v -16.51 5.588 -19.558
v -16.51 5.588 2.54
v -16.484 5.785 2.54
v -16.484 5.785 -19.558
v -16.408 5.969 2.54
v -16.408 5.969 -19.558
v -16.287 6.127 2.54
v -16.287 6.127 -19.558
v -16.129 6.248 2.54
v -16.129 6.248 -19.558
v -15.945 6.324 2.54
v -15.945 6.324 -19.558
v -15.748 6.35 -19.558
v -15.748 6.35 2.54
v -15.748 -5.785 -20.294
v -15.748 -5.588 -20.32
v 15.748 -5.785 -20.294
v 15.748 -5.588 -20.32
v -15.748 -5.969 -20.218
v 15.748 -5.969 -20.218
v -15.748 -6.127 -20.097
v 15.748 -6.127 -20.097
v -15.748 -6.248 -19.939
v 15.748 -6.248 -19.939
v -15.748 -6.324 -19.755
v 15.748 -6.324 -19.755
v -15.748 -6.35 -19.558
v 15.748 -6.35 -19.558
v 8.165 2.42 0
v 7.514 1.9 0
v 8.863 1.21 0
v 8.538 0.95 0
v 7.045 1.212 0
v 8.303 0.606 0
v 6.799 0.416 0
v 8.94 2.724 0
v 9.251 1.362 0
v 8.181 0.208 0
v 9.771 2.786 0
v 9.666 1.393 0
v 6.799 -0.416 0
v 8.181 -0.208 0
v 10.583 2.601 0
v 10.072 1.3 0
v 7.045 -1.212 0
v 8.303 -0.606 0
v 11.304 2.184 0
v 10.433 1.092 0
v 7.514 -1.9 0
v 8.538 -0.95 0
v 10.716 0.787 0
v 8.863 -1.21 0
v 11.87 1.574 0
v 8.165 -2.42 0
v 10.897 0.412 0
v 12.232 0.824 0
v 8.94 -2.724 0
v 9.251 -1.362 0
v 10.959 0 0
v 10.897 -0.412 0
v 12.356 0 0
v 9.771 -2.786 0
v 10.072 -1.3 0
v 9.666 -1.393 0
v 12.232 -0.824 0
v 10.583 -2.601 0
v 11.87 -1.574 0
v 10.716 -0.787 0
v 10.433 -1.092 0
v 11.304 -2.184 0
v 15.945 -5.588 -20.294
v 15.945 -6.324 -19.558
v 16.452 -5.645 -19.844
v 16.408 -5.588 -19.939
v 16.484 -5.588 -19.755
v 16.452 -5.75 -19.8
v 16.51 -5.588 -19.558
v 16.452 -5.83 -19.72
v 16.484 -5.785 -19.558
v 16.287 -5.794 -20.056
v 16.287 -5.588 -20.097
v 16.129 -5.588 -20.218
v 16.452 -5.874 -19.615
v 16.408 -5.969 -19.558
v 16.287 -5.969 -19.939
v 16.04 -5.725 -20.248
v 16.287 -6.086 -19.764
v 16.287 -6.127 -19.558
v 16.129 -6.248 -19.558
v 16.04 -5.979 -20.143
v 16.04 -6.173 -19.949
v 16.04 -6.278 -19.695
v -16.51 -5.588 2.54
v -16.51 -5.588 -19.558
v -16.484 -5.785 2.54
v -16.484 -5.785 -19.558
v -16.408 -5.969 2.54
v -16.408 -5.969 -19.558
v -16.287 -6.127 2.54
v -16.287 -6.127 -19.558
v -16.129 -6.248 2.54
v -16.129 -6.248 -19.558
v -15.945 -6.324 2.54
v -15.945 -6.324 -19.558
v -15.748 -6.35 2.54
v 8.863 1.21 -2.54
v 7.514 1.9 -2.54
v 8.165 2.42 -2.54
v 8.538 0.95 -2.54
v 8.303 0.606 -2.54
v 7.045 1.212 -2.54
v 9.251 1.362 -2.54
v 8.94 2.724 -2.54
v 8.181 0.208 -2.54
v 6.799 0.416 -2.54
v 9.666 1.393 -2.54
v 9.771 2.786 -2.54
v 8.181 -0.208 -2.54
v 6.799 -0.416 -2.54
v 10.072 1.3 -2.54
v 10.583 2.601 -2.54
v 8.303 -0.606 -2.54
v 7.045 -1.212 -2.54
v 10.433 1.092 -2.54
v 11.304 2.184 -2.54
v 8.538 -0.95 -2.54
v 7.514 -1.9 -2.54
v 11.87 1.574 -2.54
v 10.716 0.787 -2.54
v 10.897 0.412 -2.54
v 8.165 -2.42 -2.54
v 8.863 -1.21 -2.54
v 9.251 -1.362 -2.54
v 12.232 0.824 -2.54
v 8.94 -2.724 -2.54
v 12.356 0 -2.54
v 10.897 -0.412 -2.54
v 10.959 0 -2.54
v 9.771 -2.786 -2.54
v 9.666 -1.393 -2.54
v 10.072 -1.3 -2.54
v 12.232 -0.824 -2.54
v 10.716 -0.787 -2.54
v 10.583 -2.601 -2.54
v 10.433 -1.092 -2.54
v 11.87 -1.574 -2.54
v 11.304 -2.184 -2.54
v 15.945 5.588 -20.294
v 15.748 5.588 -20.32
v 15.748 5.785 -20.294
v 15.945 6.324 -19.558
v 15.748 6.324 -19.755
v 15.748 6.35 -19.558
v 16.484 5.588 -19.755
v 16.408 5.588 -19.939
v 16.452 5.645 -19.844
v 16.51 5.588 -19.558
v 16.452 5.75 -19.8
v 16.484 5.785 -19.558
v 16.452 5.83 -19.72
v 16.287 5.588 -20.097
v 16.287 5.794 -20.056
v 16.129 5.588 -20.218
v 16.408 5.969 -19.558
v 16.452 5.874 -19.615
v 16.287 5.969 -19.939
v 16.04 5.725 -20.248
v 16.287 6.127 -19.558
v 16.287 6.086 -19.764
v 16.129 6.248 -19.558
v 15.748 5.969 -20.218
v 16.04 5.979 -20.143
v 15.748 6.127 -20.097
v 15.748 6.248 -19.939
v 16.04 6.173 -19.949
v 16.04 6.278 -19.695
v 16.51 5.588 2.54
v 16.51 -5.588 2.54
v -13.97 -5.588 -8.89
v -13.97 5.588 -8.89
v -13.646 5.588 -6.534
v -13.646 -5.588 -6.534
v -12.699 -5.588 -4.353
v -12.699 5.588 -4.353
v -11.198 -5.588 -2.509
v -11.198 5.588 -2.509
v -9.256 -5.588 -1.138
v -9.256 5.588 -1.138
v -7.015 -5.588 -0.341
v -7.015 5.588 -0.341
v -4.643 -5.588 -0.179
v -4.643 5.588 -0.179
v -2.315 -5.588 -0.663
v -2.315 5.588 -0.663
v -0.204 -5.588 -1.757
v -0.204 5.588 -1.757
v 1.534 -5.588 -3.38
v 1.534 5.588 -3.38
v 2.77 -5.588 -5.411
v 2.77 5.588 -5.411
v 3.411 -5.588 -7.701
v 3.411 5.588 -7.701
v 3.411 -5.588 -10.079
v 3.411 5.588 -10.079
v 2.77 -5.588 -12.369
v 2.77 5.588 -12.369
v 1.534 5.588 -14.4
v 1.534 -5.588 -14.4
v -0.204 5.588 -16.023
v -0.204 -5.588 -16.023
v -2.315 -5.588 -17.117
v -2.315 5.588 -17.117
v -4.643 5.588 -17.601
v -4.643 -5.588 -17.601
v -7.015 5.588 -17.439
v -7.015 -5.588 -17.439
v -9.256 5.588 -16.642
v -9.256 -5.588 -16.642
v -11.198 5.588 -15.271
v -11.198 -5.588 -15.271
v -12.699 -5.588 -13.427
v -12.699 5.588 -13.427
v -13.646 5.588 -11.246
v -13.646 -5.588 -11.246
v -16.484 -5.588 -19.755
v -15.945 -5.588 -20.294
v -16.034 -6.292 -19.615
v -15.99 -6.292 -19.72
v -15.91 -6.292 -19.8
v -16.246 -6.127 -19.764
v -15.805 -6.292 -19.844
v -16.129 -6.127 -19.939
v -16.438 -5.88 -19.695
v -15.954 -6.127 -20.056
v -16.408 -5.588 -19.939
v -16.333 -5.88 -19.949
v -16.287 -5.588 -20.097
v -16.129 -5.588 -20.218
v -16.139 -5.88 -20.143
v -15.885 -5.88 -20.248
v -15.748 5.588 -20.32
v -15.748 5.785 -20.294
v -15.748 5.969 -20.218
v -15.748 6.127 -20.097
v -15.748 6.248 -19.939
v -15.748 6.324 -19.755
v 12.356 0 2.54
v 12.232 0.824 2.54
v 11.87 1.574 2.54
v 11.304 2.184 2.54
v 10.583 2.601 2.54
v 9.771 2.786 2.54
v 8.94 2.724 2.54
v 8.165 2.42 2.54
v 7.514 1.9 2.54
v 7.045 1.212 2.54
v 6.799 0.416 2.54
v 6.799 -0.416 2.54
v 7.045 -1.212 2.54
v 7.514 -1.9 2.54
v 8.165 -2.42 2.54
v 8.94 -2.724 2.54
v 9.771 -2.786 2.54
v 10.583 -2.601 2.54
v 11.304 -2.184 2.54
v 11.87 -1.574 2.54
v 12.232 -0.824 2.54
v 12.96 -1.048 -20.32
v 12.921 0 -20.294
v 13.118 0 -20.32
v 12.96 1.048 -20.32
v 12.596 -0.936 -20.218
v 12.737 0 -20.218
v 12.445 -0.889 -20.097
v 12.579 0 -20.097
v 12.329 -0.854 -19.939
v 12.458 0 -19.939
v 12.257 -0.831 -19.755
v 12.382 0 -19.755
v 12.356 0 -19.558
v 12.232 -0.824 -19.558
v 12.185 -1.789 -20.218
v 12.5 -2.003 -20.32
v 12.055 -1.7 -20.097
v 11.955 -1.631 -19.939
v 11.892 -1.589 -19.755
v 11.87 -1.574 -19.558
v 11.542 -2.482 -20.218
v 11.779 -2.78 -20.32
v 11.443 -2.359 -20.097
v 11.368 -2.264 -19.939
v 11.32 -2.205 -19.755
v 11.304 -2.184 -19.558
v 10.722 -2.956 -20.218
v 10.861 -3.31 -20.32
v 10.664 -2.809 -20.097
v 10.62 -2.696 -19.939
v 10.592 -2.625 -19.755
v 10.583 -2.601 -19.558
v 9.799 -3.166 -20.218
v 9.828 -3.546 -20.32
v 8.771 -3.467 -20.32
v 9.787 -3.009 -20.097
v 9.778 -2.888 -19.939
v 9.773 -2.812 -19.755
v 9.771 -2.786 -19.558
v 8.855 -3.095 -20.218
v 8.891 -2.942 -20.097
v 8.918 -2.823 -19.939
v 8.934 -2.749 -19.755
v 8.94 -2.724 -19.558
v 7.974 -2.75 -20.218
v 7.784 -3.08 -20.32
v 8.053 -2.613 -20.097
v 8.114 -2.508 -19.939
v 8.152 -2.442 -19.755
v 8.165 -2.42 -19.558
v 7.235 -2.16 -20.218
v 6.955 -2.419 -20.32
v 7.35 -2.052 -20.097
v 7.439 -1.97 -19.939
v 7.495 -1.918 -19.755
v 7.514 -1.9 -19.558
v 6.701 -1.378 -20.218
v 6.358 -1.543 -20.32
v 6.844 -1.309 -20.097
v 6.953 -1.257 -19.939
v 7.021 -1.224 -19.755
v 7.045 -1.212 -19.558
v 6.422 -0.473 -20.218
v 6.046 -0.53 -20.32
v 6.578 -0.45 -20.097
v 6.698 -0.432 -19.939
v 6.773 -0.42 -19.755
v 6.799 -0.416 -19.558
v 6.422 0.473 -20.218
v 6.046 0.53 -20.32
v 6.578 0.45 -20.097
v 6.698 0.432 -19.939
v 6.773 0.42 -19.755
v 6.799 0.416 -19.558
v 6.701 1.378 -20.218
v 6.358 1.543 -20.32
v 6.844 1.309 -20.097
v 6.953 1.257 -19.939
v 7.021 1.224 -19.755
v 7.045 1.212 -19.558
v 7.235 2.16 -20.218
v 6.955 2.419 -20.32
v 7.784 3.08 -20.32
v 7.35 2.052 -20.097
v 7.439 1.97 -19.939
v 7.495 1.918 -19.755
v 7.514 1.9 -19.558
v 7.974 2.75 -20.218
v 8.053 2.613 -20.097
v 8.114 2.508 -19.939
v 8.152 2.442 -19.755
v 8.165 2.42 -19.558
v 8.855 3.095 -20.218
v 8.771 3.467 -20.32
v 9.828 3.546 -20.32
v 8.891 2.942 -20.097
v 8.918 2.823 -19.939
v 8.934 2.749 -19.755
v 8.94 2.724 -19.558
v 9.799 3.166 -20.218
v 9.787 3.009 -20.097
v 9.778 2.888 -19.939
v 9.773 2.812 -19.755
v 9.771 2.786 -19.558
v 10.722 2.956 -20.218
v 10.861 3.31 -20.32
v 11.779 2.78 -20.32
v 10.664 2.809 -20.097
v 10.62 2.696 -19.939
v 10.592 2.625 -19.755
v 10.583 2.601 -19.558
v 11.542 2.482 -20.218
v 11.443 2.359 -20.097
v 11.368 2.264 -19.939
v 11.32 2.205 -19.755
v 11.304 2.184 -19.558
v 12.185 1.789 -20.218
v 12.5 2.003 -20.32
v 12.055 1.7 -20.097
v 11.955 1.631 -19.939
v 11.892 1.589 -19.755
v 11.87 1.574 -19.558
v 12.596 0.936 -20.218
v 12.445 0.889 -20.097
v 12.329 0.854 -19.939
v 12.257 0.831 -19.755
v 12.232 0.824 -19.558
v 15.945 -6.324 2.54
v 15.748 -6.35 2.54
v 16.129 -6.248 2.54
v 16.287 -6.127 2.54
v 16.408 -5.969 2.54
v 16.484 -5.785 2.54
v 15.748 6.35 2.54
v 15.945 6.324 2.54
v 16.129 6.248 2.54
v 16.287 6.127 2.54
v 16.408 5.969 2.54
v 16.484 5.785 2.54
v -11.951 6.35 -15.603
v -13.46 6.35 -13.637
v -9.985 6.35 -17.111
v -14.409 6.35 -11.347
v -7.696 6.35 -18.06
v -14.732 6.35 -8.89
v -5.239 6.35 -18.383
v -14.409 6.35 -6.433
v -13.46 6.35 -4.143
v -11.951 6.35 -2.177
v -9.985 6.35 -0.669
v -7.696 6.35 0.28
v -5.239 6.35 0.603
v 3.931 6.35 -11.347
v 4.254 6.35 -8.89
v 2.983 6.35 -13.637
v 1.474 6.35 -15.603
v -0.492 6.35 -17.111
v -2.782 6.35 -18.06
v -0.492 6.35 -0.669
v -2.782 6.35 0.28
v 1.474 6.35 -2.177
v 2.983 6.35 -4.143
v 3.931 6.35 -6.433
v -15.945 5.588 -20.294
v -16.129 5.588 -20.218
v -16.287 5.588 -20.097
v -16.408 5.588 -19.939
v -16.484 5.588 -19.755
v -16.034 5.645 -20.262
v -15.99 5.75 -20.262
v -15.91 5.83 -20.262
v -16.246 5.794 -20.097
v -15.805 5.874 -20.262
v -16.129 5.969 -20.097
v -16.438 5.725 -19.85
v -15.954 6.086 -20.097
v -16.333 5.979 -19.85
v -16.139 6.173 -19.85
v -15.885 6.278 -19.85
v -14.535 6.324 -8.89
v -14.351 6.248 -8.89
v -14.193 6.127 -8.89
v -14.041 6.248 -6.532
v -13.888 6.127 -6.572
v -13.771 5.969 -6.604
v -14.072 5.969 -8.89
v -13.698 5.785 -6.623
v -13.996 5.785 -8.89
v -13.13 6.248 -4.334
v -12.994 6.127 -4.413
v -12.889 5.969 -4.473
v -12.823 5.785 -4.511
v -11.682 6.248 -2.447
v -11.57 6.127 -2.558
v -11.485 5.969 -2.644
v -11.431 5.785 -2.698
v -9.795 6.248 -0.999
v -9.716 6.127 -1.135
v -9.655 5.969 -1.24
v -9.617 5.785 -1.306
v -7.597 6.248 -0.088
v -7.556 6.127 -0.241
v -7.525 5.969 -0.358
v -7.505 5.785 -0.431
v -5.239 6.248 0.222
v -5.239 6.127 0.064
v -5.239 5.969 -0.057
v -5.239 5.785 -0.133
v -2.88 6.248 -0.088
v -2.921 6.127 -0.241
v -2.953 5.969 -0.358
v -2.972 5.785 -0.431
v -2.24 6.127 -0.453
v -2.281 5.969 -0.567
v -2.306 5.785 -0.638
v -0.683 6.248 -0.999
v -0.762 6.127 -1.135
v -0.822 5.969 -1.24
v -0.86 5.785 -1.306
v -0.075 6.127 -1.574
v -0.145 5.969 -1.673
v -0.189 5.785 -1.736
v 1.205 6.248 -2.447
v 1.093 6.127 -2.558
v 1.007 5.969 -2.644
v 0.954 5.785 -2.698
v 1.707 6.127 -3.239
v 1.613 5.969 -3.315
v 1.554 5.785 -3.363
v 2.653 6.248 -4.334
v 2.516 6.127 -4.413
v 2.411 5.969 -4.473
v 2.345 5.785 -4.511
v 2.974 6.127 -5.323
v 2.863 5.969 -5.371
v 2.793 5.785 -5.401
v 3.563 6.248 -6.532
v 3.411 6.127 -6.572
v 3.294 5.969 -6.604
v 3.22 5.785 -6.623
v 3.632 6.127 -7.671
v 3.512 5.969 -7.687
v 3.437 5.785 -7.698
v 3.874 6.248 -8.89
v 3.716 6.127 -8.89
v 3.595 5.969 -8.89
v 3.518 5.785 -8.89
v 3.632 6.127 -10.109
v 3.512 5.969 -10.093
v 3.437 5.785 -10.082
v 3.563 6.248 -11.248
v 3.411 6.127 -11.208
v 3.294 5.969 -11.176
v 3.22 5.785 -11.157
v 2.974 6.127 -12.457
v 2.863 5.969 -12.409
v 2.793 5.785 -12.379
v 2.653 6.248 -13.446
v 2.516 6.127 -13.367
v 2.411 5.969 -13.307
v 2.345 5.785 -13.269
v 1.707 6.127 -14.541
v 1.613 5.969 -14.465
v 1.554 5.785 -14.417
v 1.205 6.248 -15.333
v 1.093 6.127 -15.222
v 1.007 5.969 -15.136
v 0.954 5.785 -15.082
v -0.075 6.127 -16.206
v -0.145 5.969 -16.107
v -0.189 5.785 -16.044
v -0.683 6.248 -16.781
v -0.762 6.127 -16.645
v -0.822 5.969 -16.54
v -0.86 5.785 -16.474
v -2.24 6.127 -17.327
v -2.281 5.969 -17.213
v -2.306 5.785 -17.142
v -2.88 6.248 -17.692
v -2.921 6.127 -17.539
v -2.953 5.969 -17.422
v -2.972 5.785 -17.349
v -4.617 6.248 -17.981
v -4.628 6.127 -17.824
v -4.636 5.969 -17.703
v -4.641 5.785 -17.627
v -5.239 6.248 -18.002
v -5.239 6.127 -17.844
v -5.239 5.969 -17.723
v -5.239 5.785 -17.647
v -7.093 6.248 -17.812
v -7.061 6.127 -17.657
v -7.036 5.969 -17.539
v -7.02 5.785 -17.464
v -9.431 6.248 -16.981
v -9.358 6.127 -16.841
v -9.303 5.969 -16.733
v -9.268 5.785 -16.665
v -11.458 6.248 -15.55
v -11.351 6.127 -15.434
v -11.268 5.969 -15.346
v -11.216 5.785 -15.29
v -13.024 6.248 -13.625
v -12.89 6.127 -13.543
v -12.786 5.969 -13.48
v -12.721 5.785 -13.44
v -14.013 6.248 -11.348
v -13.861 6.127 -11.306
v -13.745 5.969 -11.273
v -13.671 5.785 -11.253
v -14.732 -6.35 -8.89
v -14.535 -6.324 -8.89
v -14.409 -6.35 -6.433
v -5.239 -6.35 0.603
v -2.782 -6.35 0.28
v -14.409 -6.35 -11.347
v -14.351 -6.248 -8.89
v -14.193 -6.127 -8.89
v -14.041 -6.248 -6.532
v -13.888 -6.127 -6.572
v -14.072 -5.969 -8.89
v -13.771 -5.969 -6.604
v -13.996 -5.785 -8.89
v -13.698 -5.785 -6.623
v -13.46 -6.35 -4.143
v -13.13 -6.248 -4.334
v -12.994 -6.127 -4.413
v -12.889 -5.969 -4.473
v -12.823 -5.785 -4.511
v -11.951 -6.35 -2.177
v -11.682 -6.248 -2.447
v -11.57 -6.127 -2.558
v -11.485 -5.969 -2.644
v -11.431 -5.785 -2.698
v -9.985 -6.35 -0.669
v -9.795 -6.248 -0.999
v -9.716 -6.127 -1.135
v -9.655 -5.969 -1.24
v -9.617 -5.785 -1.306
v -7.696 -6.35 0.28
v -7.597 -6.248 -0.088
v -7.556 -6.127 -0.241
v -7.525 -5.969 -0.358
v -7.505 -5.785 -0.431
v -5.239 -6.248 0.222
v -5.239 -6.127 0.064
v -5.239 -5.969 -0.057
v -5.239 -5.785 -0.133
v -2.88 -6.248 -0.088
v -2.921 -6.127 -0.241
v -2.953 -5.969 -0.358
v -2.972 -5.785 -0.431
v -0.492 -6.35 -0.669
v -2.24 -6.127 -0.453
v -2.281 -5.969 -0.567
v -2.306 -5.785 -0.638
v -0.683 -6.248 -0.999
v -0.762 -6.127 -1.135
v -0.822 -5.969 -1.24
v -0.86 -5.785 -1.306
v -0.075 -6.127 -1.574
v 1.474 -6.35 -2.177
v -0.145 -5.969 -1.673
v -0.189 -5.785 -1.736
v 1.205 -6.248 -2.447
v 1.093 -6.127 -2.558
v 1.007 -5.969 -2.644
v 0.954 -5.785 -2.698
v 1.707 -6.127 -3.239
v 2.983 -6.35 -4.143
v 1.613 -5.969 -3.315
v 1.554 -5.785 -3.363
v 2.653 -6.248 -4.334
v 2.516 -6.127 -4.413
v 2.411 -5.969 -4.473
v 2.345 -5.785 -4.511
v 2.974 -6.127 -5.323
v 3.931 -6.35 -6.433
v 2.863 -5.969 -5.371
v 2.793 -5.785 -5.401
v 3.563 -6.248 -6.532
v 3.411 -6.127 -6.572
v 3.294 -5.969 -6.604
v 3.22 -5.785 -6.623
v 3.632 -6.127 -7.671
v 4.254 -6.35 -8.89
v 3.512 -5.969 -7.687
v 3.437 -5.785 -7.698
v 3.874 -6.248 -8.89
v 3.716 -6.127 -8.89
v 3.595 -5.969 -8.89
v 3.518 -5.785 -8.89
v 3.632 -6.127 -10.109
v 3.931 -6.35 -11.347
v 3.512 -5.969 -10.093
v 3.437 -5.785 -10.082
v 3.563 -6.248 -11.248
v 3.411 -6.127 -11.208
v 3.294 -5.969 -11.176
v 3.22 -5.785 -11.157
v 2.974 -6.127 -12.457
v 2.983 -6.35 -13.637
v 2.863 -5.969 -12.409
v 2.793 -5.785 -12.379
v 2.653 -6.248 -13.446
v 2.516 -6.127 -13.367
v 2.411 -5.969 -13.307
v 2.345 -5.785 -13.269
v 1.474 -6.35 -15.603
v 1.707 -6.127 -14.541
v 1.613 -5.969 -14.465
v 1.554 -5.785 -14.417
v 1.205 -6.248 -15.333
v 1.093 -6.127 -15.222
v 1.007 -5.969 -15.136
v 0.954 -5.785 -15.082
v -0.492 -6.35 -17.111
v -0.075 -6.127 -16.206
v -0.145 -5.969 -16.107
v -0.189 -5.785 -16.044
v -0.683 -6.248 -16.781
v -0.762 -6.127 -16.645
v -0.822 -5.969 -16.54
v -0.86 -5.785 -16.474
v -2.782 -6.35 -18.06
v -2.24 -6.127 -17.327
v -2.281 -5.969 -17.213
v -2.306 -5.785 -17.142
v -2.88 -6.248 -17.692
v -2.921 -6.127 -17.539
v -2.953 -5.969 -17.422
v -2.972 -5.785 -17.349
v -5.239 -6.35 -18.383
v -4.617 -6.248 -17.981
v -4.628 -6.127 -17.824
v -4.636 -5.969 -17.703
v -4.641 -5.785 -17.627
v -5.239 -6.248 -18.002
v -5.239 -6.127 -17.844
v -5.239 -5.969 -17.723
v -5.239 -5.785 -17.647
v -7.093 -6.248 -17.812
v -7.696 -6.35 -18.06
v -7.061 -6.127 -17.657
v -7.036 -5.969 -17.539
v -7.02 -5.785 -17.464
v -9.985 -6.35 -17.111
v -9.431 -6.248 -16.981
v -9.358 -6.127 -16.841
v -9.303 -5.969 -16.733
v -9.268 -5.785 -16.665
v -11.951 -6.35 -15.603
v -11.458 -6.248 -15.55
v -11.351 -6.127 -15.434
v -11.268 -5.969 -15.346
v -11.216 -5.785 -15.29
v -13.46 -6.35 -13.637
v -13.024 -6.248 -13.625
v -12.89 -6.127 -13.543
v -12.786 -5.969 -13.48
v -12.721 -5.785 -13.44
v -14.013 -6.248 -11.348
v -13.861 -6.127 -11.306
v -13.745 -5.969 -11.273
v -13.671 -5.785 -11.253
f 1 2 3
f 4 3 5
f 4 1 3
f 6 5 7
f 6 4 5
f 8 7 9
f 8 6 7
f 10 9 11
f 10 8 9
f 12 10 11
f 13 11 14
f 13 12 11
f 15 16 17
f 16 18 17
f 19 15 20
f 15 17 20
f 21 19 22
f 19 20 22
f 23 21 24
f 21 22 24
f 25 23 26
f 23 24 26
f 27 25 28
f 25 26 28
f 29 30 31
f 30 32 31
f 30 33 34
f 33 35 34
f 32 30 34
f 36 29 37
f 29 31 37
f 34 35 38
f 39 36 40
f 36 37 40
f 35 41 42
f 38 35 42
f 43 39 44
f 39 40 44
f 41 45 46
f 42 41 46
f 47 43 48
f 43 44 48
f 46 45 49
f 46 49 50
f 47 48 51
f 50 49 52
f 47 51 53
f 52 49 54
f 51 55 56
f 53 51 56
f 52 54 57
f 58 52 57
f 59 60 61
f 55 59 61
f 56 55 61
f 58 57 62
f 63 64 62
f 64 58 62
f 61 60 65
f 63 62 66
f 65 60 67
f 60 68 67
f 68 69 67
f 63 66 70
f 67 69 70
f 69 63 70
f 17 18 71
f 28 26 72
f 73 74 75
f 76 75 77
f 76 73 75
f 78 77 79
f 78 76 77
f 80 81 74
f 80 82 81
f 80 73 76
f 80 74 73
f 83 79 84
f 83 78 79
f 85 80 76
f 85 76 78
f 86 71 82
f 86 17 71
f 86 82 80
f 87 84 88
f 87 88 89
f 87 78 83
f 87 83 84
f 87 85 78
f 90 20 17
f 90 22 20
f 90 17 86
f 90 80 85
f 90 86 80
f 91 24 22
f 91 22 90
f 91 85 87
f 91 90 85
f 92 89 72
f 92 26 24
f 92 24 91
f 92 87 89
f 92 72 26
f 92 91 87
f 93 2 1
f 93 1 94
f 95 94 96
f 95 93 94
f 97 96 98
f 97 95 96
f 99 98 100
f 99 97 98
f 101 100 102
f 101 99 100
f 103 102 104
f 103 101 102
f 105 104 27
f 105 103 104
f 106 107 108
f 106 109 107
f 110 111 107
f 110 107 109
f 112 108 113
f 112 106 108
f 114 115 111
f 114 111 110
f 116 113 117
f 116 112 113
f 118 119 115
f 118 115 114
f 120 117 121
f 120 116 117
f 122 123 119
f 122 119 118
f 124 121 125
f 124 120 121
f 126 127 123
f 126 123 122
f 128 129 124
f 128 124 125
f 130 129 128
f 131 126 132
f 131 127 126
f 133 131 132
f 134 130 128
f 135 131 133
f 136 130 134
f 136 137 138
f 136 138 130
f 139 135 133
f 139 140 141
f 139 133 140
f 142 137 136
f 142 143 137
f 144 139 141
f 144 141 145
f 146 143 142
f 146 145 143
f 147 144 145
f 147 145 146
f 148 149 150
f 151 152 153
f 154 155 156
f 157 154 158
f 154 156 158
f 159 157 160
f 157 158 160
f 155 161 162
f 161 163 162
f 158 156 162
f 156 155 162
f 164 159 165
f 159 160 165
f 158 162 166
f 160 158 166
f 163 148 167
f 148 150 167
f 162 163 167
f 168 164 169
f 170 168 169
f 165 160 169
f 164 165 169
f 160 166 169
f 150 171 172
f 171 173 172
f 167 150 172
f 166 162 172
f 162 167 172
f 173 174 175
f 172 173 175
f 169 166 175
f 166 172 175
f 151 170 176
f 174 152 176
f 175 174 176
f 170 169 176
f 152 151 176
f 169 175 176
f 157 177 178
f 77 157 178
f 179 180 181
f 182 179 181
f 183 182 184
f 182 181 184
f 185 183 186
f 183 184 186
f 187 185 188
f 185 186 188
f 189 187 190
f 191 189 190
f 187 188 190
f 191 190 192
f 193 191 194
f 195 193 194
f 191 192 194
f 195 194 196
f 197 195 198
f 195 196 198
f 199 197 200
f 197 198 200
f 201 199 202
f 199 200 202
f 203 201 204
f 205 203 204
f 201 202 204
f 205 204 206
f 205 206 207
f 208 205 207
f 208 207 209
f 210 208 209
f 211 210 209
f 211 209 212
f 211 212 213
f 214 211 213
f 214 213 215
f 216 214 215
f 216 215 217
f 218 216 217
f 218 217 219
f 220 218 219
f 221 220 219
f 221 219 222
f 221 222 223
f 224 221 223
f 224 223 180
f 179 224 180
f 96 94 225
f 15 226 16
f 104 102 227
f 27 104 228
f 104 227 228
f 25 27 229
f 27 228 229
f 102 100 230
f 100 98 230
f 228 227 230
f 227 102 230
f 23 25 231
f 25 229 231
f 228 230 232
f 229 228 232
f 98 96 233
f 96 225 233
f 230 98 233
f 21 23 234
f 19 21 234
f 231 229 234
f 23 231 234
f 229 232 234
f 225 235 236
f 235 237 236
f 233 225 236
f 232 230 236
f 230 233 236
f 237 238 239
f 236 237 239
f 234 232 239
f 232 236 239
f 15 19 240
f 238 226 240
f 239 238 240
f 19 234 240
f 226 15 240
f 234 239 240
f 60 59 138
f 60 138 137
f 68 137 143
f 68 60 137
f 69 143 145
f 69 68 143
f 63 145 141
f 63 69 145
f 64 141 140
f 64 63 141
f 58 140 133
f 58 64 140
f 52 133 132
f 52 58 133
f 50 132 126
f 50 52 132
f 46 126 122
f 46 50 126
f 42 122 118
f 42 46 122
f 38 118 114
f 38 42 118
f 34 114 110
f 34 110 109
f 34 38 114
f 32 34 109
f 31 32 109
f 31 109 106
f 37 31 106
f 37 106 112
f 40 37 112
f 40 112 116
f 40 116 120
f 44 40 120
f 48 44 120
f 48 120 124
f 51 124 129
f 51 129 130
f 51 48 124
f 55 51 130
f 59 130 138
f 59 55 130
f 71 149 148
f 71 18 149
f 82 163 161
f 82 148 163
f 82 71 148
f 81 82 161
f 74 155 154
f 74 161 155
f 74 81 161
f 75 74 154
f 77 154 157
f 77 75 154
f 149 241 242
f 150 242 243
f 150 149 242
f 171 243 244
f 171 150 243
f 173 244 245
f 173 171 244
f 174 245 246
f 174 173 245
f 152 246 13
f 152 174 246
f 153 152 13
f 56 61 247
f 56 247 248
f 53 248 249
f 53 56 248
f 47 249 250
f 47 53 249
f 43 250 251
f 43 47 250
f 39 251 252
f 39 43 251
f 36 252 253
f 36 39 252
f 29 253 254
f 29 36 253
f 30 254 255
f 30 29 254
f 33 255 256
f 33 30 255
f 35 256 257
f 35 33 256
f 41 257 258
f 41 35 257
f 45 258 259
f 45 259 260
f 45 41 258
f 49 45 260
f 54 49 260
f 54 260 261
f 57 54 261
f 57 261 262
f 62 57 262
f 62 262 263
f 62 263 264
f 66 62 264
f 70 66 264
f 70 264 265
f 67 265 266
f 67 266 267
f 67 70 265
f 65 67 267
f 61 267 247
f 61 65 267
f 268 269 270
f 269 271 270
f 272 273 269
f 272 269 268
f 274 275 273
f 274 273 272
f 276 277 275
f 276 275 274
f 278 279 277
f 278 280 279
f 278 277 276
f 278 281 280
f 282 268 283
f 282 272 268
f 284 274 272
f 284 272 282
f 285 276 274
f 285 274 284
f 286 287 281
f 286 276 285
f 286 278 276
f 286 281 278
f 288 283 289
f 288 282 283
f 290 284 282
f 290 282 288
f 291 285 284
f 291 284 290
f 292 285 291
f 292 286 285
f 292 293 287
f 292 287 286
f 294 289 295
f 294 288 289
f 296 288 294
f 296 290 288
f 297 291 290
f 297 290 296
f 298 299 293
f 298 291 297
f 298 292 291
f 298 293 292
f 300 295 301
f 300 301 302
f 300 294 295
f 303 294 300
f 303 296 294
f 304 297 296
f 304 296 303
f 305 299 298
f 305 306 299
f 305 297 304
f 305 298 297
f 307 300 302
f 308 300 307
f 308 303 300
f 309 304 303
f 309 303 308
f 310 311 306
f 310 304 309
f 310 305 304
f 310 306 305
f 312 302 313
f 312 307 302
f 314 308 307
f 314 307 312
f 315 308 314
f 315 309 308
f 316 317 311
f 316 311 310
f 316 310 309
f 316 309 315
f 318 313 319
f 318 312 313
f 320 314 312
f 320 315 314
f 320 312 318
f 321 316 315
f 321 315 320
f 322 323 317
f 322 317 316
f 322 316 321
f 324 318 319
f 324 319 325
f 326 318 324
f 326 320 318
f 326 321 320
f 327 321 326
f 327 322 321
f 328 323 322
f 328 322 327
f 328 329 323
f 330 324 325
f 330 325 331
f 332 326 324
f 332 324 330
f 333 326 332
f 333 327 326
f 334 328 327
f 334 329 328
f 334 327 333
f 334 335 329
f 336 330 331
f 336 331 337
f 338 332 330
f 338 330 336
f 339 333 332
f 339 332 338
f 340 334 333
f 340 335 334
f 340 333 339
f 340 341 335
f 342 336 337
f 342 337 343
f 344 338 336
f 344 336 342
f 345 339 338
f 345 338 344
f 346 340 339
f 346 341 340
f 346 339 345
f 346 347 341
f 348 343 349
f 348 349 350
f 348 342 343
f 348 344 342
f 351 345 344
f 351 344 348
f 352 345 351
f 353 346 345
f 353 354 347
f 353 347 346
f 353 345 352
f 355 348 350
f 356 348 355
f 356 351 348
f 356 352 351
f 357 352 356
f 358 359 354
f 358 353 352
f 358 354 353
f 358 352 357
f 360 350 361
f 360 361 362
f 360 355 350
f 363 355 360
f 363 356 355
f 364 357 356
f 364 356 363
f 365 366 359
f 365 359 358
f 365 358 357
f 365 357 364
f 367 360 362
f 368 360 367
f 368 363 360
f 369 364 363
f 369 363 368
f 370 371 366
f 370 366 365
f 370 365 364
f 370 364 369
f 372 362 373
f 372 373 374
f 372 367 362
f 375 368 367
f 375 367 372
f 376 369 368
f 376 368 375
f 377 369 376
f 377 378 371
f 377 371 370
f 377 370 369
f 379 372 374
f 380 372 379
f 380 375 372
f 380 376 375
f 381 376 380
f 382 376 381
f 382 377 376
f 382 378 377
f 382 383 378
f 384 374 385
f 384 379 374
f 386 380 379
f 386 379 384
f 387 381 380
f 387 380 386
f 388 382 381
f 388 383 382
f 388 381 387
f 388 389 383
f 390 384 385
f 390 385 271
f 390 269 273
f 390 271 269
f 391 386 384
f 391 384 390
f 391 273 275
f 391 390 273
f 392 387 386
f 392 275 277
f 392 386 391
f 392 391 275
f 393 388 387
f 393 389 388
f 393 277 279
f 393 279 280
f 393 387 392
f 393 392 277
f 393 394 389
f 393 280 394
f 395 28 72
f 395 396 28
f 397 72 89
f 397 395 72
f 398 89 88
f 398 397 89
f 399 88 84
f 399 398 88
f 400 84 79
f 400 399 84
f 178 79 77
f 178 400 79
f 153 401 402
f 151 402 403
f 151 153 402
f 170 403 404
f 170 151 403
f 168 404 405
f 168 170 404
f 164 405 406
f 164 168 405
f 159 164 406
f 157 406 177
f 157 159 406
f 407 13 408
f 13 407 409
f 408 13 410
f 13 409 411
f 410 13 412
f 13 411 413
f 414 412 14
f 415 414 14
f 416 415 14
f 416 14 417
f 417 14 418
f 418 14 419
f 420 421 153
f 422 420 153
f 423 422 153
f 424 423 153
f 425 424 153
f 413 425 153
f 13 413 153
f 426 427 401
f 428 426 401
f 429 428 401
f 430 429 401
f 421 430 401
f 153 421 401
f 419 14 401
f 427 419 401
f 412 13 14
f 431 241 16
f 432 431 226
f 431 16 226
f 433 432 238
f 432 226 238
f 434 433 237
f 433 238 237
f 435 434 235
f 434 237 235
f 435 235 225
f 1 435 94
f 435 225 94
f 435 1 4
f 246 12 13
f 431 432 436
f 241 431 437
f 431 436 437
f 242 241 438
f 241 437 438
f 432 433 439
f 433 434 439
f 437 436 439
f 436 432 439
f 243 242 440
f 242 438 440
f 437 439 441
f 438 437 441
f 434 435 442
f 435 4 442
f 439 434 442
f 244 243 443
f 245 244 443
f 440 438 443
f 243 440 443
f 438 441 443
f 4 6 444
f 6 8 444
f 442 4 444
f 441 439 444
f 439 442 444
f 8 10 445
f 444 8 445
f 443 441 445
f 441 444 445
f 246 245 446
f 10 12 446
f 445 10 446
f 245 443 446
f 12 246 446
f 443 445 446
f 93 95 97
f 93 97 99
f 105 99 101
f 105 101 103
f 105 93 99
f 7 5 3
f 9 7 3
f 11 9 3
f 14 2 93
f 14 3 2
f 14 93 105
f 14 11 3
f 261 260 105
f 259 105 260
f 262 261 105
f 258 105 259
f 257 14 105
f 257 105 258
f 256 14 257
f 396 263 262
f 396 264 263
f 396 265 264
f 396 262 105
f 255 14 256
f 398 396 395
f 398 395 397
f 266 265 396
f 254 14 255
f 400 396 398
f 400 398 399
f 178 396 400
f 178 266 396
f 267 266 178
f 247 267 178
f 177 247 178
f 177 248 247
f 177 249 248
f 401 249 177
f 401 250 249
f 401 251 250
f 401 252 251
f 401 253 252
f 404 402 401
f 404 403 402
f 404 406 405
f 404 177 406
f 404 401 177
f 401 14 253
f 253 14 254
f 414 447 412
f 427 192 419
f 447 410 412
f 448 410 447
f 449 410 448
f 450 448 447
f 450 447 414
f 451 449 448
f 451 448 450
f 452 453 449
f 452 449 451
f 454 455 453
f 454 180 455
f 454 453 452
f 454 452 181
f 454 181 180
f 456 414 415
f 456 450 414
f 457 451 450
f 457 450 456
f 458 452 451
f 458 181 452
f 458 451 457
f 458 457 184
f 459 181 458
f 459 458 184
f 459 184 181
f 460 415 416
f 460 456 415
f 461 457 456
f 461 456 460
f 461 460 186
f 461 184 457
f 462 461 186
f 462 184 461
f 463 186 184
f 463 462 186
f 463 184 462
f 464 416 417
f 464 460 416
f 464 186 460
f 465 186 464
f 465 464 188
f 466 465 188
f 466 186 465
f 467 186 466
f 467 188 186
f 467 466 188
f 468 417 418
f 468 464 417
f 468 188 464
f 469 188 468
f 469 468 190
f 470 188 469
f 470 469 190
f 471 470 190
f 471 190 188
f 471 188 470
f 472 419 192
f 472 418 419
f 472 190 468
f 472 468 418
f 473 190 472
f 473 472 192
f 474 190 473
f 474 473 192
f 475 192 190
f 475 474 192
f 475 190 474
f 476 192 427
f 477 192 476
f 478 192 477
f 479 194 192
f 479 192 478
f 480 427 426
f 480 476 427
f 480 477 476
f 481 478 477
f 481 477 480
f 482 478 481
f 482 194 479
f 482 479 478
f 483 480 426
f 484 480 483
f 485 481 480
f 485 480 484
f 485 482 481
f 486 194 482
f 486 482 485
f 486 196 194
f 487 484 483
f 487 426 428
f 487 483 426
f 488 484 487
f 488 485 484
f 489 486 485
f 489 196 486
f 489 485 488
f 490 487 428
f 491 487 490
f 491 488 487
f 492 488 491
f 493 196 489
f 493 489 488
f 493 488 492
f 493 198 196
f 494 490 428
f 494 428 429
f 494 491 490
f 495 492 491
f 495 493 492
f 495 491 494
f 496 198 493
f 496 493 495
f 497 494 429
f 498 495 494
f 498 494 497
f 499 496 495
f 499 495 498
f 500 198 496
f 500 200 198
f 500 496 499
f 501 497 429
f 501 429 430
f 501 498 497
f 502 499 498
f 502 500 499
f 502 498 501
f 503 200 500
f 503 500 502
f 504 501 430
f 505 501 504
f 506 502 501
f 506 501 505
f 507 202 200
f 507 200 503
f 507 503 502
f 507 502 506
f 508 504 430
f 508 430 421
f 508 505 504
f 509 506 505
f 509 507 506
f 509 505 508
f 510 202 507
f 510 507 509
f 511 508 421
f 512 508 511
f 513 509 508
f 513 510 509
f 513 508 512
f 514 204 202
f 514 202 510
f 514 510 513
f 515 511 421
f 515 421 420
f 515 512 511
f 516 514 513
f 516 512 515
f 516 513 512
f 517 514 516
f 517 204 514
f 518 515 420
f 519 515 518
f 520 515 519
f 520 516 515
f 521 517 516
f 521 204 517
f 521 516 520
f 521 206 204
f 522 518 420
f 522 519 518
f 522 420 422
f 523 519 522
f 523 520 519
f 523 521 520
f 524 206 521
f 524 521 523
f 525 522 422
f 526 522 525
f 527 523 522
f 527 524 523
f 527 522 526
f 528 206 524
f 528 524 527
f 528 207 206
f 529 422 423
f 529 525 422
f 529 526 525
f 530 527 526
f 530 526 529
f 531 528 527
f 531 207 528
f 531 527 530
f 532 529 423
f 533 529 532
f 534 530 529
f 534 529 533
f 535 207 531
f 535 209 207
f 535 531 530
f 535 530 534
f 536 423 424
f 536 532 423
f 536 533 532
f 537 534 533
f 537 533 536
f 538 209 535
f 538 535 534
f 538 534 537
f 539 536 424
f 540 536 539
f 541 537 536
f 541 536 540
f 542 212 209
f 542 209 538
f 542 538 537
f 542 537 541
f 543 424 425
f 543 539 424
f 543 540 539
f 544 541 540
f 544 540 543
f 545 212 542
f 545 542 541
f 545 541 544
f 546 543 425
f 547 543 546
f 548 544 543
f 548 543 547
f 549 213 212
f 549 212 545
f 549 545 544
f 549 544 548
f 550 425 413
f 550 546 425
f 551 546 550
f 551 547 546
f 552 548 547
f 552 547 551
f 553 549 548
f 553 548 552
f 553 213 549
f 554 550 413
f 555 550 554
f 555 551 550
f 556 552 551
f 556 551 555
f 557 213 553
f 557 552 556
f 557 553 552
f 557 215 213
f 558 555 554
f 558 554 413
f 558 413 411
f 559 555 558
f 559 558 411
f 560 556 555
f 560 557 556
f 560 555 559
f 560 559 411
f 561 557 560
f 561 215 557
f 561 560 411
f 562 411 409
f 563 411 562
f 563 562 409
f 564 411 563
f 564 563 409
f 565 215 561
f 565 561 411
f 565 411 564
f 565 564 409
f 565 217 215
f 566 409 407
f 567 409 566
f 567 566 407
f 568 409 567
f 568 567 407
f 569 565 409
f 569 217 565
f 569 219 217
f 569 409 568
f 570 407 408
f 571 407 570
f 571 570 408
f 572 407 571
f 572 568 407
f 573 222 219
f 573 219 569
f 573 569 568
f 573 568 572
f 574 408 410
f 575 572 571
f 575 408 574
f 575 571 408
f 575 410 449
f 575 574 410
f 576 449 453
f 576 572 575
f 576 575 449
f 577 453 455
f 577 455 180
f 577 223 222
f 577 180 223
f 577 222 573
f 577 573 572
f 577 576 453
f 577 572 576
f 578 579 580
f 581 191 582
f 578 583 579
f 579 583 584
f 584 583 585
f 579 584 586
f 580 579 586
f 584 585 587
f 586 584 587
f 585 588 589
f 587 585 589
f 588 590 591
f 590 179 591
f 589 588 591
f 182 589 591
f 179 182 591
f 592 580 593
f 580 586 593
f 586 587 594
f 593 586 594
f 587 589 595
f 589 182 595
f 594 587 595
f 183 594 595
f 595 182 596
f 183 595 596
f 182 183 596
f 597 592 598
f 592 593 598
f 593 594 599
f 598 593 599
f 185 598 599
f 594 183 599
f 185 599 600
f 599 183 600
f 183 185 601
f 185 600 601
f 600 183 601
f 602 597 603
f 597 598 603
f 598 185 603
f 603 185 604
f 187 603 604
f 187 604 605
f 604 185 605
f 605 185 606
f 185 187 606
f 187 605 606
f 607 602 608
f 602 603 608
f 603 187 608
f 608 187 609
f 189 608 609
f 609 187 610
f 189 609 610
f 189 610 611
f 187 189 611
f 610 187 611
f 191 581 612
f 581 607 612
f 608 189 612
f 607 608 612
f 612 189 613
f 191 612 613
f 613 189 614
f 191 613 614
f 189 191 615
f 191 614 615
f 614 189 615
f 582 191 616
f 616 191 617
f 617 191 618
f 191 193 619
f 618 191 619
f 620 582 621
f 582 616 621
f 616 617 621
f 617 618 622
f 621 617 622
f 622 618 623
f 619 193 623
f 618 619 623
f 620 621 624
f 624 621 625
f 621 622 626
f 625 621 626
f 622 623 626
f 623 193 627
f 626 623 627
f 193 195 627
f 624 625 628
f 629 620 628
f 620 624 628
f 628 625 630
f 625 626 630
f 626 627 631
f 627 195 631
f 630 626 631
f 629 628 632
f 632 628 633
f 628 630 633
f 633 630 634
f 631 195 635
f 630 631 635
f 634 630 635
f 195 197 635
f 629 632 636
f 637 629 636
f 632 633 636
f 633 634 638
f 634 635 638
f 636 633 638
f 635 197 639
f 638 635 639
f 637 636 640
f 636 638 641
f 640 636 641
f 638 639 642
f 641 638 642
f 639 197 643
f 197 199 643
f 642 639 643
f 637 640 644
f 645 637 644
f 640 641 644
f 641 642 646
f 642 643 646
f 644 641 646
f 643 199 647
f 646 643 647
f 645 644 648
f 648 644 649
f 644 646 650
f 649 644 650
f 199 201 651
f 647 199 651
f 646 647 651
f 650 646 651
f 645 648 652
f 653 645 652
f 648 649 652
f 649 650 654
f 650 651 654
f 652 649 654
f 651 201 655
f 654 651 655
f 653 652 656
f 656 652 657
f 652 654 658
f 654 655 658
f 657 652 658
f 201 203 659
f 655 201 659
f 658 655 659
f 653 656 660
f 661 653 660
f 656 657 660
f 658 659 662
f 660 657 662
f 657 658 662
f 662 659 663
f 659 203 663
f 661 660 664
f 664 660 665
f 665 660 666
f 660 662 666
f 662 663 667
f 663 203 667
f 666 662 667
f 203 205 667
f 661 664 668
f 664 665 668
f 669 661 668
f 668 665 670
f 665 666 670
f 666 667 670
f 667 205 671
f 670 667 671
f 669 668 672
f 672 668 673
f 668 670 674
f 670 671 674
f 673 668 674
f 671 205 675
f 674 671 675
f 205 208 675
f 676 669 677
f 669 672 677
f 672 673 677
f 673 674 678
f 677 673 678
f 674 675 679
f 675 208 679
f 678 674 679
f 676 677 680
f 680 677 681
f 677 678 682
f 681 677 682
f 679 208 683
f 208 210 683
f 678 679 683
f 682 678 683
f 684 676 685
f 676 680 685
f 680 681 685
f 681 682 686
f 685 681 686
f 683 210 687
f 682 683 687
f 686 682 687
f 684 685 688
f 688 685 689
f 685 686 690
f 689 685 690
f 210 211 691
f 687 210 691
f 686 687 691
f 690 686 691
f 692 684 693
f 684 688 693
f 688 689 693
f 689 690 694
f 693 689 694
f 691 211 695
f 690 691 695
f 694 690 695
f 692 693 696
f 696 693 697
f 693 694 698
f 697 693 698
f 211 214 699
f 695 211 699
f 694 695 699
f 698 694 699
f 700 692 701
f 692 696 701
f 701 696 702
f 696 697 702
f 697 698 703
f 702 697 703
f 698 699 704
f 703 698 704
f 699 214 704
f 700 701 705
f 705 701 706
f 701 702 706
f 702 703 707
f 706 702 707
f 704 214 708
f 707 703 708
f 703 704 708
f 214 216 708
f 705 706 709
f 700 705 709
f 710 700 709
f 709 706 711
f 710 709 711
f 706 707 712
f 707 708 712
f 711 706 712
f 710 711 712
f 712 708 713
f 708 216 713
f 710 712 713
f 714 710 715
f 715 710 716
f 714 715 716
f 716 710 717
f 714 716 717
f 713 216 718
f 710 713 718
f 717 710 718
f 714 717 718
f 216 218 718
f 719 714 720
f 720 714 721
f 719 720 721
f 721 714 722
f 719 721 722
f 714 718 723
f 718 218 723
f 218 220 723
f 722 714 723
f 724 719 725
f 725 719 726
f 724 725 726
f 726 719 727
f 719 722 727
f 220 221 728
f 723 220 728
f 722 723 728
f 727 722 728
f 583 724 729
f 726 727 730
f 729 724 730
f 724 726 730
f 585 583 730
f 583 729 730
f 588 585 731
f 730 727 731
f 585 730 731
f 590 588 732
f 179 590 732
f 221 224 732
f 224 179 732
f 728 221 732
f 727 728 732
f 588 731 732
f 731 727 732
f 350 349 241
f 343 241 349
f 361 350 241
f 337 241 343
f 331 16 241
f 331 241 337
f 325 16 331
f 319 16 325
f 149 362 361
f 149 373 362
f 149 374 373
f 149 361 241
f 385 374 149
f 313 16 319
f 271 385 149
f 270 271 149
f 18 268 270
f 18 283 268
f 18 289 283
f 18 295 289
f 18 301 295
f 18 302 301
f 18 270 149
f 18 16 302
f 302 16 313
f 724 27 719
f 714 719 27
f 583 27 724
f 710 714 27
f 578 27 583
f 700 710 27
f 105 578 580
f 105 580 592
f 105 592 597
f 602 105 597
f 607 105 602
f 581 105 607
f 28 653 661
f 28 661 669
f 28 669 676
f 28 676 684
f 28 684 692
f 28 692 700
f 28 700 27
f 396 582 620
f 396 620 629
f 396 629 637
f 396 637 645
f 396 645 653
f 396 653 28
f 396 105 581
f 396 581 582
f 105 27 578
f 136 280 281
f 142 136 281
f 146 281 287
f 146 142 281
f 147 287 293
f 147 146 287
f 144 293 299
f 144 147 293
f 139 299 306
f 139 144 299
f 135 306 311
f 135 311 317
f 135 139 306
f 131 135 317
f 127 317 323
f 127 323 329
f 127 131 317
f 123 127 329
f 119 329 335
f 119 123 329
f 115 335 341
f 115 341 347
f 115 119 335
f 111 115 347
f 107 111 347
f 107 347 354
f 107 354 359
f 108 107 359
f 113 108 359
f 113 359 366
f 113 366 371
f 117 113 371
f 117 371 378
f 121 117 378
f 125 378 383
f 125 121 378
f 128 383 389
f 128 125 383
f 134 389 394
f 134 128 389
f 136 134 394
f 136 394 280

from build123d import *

# Parameters (mm, degrees)
F0_W     = 33.02
F0_H     = 12.7
F0_R     = 2.794
F1_DEPTH = 2.54
F2_W     = 33.02
F2_H     = 12.7
F2_R     = 1.397
F3_DEPTH = 2.54
F4_W     = 33.02
F4_H     = 12.7
F4_R     = 2.794
F5_DEPTH = 17.78
F6_R     = 8.73125
F7_DEPTH = 12.701
F8_R     = 0.762
F9_R     = 0.762
F10_R    = 0.762


with BuildPart() as f1:
    # F0 (on Top) → F1 (new body)
    with BuildSketch(Plane.XY):
        Rectangle(F0_W, F0_H)
        with Locations((9.561962, 0)):
            Circle(F0_R, mode=Mode.SUBTRACT)
    extrude(amount=F1_DEPTH)

    # F2 (on face) → F3 (join)
    with BuildSketch(Plane(origin=(0, 0, 0), x_dir=(1, 0, 0), z_dir=(0, 0, -1))):
        Rectangle(F2_W, F2_H)
        with Locations((9.561962, 0)):
            Circle(F2_R, mode=Mode.SUBTRACT)
    extrude(amount=F3_DEPTH)

    # F4 (on face) → F5 (join)
    with BuildSketch(Plane(origin=(0, 0, -2.54), x_dir=(1, 0, 0), z_dir=(0, 0, -1))):
        Rectangle(F4_W, F4_H)
        with Locations((9.561962, 0)):
            Circle(F4_R, mode=Mode.SUBTRACT)
    extrude(amount=F5_DEPTH)

    # F6 (on face) → F7 (cut, through all)
    with BuildSketch(Plane(origin=(0, 6.35, 0), x_dir=(-1, 0, 0), z_dir=(0, 1, 0))):
        with Locations((5.23875, -8.89)):
            Circle(F6_R)
    extrude(amount=-F7_DEPTH, mode=Mode.SUBTRACT)

    # F8
    f8_edges = [f1.edges().sort_by_distance(p)[0] for p in [
        (3.4925, -6.35, -8.89),
        (3.4925, 6.35, -8.89),
    ]]
    fillet(f8_edges, radius=F8_R)

    # F9
    f9_edges = [f1.edges().sort_by_distance(p)[0] for p in [
        (6.767962, 0, -20.32),
    ]]
    fillet(f9_edges, radius=F9_R)

    # F10
    f10_edges = [f1.edges().sort_by_distance(p)[0] for p in [
        (-16.51, 6.35, -8.89),
        (-16.51, 0, -20.32),
        (-16.51, -6.35, -8.89),
        (0, -6.35, -20.32),
        (0, 6.35, -20.32),
        (16.51, 0, -20.32),
        (16.51, 6.35, -8.89),
        (16.51, -6.35, -8.89),
    ]]
    fillet(f10_edges, radius=F10_R)


solid = f1.part
